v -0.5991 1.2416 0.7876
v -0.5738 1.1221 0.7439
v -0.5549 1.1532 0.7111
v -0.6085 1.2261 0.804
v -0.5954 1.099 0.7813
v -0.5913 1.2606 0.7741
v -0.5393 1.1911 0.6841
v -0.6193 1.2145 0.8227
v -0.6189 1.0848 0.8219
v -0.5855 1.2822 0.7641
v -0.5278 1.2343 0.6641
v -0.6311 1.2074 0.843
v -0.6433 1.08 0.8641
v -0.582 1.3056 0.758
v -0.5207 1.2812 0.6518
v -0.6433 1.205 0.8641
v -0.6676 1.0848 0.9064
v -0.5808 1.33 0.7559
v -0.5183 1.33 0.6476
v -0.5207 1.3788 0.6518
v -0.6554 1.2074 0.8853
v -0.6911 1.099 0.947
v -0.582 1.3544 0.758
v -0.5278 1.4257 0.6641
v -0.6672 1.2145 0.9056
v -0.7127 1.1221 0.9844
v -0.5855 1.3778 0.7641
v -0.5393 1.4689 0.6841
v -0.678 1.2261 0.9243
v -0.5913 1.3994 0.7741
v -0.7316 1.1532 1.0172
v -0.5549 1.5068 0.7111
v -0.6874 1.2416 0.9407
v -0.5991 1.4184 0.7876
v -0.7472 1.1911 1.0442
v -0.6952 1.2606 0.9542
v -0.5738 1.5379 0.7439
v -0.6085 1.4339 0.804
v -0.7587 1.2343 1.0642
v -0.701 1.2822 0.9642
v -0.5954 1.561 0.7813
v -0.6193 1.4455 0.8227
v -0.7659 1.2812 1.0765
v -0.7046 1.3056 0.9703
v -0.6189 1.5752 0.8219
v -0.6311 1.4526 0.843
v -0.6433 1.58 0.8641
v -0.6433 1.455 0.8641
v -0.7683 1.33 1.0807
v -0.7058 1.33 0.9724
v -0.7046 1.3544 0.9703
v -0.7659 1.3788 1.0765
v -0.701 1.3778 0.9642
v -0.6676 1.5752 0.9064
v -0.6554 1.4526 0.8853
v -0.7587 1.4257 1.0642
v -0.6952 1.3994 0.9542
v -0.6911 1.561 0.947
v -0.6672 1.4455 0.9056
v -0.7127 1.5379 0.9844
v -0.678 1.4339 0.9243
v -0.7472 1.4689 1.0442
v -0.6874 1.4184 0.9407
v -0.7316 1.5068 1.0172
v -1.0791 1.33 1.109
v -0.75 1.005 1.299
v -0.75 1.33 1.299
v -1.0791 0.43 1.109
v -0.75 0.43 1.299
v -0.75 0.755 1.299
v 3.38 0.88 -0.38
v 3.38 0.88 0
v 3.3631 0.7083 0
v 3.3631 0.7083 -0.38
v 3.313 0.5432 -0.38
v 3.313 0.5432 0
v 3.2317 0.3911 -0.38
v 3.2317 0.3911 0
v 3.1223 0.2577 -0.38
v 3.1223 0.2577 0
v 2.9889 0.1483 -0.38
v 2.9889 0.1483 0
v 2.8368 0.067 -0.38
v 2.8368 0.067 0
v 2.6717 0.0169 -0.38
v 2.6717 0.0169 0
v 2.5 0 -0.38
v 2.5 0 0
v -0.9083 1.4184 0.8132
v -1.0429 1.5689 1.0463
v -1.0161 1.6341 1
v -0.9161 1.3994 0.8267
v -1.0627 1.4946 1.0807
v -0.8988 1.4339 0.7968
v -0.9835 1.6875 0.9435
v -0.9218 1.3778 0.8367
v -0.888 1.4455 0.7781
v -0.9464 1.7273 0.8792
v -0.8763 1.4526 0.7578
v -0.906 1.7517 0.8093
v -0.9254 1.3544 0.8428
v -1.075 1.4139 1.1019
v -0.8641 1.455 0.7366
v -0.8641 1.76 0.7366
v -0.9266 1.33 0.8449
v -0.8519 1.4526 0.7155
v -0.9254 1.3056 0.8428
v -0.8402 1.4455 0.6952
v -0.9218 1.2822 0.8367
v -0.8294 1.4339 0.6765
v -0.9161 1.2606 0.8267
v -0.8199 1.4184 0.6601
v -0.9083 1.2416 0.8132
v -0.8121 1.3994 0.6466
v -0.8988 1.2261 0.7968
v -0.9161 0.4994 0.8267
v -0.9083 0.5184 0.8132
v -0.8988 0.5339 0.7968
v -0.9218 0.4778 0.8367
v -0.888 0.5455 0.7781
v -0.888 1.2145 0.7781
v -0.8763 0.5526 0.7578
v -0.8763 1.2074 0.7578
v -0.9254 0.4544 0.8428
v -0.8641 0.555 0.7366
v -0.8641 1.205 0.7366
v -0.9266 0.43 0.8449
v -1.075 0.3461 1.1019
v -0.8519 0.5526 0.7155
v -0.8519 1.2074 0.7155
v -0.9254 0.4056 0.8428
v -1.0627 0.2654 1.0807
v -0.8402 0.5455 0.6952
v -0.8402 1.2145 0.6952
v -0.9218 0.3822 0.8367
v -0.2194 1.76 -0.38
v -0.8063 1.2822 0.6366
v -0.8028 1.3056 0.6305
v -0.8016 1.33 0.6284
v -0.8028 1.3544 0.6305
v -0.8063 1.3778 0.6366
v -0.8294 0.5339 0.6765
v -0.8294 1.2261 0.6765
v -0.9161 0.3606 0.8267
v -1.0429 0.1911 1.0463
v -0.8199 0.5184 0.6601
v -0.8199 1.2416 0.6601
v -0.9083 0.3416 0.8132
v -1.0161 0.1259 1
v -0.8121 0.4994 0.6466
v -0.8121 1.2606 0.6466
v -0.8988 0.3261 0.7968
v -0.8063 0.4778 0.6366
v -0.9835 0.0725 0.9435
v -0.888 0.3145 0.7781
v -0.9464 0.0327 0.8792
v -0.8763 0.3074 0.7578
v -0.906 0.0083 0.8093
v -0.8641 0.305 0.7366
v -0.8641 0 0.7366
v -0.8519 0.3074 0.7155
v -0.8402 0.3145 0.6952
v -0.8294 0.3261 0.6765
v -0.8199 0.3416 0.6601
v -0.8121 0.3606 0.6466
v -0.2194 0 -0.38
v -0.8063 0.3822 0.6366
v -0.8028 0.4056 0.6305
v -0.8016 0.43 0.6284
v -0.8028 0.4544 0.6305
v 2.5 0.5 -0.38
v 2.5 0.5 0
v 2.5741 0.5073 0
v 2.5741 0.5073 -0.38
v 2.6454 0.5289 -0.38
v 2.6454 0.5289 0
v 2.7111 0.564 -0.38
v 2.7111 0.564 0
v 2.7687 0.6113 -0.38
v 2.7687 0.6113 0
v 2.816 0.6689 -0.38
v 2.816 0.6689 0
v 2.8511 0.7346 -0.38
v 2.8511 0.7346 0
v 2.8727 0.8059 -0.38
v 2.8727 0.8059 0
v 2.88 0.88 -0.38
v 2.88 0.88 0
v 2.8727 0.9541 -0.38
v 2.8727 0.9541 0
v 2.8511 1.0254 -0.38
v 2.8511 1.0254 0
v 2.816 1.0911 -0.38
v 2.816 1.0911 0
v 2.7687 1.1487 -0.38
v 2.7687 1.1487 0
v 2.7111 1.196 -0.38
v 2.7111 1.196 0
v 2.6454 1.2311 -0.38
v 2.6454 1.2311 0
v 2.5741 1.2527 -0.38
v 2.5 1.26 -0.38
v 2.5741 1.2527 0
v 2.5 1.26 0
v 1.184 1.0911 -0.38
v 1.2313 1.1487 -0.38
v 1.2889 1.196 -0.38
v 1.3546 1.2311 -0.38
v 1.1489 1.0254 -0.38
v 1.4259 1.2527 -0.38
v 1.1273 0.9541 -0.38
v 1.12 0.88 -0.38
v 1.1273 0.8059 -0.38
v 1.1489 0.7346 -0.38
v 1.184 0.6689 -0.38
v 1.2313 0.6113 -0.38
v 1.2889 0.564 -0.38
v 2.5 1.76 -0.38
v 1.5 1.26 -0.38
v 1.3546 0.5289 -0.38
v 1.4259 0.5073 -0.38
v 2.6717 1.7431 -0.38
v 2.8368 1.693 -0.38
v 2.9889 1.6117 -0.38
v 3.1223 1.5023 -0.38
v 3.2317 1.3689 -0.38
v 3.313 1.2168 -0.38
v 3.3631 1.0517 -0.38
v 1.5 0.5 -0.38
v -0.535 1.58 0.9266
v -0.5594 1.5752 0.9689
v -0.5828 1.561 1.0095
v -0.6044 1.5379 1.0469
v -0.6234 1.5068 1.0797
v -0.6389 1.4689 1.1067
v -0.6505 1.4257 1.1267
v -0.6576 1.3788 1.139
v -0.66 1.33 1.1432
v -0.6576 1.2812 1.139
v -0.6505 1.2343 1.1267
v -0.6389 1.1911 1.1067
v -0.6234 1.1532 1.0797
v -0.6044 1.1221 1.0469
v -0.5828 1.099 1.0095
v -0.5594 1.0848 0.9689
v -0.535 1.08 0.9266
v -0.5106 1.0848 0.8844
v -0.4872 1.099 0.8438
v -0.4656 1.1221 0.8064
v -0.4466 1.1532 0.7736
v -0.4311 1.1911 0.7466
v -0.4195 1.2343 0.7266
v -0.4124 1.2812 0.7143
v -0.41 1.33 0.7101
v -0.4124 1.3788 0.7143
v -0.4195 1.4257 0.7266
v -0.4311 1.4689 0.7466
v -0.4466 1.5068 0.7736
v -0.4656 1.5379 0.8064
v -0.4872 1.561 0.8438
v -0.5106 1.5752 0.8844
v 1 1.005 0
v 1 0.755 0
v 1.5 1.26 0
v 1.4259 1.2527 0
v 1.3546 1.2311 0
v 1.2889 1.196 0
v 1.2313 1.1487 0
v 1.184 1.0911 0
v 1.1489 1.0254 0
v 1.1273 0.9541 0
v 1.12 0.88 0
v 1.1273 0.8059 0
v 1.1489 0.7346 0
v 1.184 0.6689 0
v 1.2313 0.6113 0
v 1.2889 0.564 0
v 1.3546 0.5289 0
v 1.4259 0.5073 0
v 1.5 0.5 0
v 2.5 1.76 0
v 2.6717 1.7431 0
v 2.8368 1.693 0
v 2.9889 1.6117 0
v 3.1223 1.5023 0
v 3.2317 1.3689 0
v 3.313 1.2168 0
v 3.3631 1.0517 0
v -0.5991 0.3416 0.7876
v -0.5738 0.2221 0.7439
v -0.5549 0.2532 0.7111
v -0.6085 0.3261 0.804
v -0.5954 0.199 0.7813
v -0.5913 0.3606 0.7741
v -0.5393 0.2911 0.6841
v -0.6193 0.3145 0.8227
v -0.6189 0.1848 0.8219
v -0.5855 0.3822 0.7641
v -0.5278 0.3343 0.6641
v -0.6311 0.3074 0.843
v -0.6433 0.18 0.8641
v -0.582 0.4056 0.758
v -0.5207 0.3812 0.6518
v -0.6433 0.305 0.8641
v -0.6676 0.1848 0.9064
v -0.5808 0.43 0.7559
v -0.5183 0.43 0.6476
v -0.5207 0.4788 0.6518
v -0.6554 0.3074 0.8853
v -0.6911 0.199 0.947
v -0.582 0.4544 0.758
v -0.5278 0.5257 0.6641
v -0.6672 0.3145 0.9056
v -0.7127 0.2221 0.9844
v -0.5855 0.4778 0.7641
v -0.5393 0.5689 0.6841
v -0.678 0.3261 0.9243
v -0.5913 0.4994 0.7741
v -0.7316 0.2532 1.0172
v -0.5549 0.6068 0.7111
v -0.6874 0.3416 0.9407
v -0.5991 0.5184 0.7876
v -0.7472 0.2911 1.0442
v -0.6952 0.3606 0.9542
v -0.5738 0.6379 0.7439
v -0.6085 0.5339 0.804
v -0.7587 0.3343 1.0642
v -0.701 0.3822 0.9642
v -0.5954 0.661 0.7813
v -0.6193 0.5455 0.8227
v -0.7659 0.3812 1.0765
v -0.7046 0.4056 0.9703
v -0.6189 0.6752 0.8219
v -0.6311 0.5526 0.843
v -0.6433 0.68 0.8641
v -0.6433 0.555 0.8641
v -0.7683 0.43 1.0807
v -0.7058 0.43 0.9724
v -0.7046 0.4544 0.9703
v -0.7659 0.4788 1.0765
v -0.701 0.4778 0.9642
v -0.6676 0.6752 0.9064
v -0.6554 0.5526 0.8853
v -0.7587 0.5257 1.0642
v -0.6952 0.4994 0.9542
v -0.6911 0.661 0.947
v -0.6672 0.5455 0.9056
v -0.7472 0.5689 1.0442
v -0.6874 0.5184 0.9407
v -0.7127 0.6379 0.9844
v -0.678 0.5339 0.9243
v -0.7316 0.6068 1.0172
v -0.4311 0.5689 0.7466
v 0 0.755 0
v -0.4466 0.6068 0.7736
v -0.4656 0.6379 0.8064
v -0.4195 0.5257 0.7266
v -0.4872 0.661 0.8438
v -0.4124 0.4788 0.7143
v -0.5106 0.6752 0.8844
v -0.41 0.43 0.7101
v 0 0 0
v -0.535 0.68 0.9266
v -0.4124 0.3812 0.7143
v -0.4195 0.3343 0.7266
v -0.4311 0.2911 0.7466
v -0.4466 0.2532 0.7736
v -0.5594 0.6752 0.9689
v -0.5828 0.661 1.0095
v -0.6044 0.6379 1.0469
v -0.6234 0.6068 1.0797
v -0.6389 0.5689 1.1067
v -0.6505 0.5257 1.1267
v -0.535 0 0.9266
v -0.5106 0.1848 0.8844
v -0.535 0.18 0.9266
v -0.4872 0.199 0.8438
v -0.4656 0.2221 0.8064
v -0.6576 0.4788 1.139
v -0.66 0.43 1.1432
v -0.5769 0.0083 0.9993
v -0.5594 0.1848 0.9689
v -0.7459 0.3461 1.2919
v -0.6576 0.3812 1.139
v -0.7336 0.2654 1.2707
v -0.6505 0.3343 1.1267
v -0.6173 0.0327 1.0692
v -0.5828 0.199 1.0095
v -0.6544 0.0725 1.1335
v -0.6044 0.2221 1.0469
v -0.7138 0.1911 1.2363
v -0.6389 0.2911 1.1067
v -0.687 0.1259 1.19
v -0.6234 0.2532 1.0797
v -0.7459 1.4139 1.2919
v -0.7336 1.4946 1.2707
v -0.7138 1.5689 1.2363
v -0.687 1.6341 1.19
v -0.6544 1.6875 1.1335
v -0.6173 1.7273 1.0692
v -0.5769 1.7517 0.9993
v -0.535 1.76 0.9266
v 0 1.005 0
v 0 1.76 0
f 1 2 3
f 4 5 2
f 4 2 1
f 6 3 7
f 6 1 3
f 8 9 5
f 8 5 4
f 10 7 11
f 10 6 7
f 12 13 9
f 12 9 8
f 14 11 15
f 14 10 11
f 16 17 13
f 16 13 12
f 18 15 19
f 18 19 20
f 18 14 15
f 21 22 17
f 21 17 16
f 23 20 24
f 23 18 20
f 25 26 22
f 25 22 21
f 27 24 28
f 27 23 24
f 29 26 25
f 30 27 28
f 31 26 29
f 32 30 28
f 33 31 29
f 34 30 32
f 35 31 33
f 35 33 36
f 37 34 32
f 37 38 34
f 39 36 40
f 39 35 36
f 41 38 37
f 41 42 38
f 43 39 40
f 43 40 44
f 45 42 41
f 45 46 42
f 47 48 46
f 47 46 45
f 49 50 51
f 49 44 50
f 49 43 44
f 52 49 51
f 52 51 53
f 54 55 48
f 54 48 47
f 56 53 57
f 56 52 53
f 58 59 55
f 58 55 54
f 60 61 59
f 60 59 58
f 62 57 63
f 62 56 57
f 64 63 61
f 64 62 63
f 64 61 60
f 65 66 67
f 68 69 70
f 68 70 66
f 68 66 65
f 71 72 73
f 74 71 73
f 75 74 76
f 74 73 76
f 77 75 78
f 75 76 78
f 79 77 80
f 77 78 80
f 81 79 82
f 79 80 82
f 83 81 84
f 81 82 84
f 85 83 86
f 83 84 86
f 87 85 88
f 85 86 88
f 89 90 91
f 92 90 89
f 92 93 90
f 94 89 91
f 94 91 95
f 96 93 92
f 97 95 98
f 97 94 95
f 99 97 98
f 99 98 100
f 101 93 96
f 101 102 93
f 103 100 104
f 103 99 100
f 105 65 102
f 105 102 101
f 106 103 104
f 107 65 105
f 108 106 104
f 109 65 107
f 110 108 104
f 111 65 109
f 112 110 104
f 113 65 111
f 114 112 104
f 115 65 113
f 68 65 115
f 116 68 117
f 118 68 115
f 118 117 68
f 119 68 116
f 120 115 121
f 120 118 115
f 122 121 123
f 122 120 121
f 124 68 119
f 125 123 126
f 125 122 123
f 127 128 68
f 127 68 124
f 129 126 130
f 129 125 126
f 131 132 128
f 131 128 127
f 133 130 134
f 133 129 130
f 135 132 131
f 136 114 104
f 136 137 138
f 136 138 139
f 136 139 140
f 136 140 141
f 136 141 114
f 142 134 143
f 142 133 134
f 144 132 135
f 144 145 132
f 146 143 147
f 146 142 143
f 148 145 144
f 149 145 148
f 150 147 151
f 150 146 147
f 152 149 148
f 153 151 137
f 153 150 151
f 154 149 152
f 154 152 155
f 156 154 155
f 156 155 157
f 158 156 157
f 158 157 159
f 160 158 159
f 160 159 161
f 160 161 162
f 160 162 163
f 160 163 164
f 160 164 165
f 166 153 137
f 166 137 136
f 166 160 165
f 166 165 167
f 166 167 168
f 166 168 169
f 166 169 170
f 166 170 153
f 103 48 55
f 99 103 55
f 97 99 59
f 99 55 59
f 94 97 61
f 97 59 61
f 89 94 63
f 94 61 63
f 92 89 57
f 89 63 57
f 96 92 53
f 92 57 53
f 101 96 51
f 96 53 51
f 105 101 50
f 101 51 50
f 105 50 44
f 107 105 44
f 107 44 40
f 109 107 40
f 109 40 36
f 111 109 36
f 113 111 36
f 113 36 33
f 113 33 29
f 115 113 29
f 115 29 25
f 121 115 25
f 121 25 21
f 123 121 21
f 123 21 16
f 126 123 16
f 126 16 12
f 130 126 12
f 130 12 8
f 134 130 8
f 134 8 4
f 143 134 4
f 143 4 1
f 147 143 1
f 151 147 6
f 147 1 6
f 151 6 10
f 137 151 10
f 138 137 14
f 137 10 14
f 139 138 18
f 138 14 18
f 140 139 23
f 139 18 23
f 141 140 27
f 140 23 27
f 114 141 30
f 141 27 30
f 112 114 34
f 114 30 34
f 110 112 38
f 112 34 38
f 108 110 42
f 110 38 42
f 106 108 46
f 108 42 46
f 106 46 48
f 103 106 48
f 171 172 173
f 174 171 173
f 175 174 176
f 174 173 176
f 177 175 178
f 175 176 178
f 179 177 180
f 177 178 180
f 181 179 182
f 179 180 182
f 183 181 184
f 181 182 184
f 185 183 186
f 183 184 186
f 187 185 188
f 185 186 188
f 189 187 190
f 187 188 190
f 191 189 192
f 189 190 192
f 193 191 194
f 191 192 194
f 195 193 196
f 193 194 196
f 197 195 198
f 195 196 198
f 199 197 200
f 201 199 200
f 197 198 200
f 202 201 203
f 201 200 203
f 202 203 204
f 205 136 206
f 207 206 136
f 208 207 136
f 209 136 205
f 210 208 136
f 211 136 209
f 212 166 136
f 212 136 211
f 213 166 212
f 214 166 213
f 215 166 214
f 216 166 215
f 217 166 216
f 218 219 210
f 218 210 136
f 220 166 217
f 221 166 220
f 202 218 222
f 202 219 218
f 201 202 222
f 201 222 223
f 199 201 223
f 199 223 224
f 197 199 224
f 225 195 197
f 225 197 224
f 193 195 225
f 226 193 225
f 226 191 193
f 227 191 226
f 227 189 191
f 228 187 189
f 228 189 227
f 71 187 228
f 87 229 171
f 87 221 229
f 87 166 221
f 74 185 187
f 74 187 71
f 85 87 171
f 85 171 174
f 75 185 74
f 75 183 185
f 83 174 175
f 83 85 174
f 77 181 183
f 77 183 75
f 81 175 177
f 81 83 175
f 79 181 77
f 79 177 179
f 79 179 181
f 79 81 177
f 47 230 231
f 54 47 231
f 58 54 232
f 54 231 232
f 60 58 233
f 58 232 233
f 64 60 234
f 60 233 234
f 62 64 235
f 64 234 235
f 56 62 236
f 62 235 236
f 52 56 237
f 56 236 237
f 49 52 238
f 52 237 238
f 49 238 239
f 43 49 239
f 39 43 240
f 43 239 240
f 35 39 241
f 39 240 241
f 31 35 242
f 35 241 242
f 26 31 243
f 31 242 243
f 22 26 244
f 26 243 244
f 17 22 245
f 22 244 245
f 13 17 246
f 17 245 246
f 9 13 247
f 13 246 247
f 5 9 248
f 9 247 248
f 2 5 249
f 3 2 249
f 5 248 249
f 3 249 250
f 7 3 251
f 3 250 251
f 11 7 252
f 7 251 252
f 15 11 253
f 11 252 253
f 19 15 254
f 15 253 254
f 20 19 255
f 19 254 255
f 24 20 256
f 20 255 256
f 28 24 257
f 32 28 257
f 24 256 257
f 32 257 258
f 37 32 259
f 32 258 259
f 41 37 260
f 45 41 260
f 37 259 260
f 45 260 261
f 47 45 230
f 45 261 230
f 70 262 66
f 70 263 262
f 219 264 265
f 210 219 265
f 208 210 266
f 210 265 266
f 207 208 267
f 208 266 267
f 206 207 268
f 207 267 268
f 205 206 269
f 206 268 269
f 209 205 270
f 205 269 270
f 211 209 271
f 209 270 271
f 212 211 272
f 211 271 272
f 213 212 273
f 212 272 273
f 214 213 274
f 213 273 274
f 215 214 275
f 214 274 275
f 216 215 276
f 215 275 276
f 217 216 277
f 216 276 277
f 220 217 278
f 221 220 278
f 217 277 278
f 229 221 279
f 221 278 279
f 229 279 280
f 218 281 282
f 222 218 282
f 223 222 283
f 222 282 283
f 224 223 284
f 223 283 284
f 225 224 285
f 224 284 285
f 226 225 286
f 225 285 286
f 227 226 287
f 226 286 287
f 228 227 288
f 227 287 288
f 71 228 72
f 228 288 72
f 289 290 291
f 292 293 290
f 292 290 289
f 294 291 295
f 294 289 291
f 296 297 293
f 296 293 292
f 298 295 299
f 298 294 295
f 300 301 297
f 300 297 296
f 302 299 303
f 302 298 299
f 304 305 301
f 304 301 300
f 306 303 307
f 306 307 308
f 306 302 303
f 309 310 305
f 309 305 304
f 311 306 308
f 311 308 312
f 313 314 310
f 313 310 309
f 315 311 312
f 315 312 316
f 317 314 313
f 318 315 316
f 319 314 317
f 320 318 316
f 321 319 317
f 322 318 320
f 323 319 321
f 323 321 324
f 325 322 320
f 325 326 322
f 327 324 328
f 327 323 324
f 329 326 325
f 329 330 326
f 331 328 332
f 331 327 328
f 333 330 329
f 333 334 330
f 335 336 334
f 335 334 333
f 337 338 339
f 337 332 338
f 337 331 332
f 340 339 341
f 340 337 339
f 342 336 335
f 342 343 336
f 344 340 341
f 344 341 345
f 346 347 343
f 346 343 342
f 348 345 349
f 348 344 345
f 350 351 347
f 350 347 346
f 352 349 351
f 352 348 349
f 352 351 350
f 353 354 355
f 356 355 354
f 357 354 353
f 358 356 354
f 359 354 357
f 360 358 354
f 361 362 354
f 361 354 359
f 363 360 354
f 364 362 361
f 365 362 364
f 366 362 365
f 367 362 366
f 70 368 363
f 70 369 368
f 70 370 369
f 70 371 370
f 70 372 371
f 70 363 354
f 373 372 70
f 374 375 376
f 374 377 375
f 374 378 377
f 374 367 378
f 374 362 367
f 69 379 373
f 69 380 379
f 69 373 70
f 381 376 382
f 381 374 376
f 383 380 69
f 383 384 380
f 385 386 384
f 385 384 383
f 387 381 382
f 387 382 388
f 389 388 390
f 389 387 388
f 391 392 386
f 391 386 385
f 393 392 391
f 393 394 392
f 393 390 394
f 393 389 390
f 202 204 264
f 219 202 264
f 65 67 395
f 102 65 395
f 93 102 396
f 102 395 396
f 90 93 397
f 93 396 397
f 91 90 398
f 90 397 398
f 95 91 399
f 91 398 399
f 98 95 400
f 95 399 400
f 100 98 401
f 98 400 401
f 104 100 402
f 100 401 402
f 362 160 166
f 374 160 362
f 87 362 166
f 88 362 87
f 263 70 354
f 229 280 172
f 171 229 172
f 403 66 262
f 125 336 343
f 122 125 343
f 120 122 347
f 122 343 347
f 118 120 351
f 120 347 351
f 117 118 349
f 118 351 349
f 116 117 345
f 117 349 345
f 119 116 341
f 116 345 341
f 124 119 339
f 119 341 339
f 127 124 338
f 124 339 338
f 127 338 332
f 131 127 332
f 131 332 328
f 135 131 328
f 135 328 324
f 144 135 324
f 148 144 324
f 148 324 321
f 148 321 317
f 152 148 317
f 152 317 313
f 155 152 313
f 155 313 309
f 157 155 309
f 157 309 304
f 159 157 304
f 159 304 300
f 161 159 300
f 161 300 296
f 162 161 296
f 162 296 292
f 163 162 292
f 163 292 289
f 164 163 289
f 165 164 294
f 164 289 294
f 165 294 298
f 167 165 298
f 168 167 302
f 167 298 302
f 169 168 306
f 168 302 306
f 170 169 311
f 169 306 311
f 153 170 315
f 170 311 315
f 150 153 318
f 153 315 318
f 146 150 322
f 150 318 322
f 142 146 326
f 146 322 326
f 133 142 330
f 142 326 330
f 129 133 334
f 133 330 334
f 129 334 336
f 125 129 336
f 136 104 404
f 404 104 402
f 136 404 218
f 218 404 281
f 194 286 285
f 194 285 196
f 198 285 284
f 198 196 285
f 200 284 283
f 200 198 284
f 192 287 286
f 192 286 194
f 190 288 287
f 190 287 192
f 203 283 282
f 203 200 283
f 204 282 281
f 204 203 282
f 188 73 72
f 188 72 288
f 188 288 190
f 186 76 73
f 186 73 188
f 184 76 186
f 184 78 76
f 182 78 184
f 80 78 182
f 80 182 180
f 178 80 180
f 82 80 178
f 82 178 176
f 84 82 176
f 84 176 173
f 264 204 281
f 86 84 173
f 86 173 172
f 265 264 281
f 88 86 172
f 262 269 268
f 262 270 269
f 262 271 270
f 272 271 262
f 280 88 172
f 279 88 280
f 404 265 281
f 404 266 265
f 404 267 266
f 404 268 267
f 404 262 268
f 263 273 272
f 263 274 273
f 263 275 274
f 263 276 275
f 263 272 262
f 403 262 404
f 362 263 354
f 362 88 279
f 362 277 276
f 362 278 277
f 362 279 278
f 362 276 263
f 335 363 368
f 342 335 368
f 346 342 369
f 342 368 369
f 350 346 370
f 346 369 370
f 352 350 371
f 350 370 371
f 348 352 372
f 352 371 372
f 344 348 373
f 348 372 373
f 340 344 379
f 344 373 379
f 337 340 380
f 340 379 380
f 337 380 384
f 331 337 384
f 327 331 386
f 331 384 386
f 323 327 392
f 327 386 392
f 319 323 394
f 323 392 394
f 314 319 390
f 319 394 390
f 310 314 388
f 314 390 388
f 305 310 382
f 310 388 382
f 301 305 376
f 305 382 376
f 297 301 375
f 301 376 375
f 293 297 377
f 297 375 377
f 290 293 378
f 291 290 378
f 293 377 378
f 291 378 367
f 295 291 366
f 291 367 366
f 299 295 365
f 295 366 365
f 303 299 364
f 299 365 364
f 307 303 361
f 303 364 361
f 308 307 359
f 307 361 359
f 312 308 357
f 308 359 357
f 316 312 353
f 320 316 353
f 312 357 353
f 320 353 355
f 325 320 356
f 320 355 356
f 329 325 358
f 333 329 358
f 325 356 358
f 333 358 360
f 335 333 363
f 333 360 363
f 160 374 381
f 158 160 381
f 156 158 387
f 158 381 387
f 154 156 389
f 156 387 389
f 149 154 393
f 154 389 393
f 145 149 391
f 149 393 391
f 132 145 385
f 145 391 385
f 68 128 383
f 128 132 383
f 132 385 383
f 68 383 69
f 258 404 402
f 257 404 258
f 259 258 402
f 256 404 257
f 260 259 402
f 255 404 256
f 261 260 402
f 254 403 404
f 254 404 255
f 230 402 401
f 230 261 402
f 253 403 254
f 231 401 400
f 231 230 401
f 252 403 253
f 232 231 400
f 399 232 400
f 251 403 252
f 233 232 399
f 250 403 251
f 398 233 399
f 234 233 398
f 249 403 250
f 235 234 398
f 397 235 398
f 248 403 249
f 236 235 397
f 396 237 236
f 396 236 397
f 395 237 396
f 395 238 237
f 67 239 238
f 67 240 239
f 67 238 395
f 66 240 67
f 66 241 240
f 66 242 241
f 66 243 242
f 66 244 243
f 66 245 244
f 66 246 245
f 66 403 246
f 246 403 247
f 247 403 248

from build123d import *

# Parameters (mm, degrees)
F1_DEPTH  = 1.76
F3_DEPTH  = 25
F4_R      = 0.25
F5_DEPTH  = 0.125
F6_DEPTH  = 25
F8_R      = 0.125
F9_DEPTH  = 25
F12_DEPTH = 0.125


with BuildPart() as f1:
    # F0 (on Front) → F1 (new body)
    with BuildSketch(Plane.XZ):
        Polygon((2.5, 0), (0, 0), (-0.75, 1.2990381057), (-1.0790896534, 1.1090381057), (-0.2193931023, -0.38), (3.38, -0.38), (3.38, 0), align=None)
    extrude(amount=-F1_DEPTH)

    # F2 (on face) → F3 (cut)
    with BuildSketch(Plane.XY):
        with BuildLine():
            Line((1.5, 0.5), (2.5, 0.5))
            ThreePointArc((2.5, 0.5), (2.88, 0.88), (2.5, 1.26))
            Line((2.5, 1.26), (1.5, 1.26))
            ThreePointArc((1.5, 1.26), (1.12, 0.88), (1.5, 0.5))
        make_face()
        with BuildLine():
            ThreePointArc((2.5, 1.76), (3.1222539674, 1.5022539674), (3.38, 0.88))
            Line((3.38, 0.88), (3.38, 1.76))
            Line((3.38, 1.76), (2.5, 1.76))
        make_face()
        with BuildLine():
            ThreePointArc((3.38, 0.88), (3.1222539674, 0.2577460326), (2.5, 0))
            Line((2.5, 0), (3.38, 0))
            Line((3.38, 0), (3.38, 0.88))
        make_face()
    extrude(amount=-F3_DEPTH, mode=Mode.SUBTRACT)

    # F4 (on face) → F5 (cut)
    with BuildSketch(Plane(origin=(0, 0, 0), x_dir=(0, 1, 0), z_dir=(0.8660254038, 0, 0.5))):
        with Locations((0.43, 1.07)):
            Circle(F4_R)
        with Locations((1.33, 1.07)):
            Circle(F4_R)
    extrude(amount=-F5_DEPTH, mode=Mode.SUBTRACT)

    # F4 (on face) → F6 (cut)
    with BuildSketch(Plane(origin=(0, 0, 0), x_dir=(0, 1, 0), z_dir=(0.8660254038, 0, 0.5))):
        with BuildLine():
            ThreePointArc((1.33, 1.5), (1.6340559159, 1.3740559159), (1.76, 1.07))
            Line((1.76, 1.07), (1.76, 1.5))
            Line((1.76, 1.5), (1.33, 1.5))
        make_face()
        with BuildLine():
            ThreePointArc((0, 1.07), (0.1259440841, 1.3740559159), (0.43, 1.5))
            Line((0.43, 1.5), (0, 1.5))
            Line((0, 1.5), (0, 1.07))
        make_face()
    extrude(amount=-F6_DEPTH, mode=Mode.SUBTRACT)

    # F8 (on offset) → F9 (cut)
    with BuildSketch(Plane(origin=(-0.1082531755, 0, -0.0625), x_dir=(0, 1, 0), z_dir=(0.8660254038, 0, 0.5))):
        with Locations((0.43, 1.07)):
            Circle(F8_R)
        with Locations((1.33, 1.07)):
            Circle(F8_R)
    extrude(amount=-F9_DEPTH, mode=Mode.SUBTRACT)

    # F11 (on offset) → F12 (join, symmetric)
    with BuildSketch(Plane.XZ.offset(-0.88)):
        Polygon((-0.75, 1.2990381057), (0, 0), (1, 0), align=None)
    extrude(amount=F12_DEPTH, both=True)


solid = f1.part
